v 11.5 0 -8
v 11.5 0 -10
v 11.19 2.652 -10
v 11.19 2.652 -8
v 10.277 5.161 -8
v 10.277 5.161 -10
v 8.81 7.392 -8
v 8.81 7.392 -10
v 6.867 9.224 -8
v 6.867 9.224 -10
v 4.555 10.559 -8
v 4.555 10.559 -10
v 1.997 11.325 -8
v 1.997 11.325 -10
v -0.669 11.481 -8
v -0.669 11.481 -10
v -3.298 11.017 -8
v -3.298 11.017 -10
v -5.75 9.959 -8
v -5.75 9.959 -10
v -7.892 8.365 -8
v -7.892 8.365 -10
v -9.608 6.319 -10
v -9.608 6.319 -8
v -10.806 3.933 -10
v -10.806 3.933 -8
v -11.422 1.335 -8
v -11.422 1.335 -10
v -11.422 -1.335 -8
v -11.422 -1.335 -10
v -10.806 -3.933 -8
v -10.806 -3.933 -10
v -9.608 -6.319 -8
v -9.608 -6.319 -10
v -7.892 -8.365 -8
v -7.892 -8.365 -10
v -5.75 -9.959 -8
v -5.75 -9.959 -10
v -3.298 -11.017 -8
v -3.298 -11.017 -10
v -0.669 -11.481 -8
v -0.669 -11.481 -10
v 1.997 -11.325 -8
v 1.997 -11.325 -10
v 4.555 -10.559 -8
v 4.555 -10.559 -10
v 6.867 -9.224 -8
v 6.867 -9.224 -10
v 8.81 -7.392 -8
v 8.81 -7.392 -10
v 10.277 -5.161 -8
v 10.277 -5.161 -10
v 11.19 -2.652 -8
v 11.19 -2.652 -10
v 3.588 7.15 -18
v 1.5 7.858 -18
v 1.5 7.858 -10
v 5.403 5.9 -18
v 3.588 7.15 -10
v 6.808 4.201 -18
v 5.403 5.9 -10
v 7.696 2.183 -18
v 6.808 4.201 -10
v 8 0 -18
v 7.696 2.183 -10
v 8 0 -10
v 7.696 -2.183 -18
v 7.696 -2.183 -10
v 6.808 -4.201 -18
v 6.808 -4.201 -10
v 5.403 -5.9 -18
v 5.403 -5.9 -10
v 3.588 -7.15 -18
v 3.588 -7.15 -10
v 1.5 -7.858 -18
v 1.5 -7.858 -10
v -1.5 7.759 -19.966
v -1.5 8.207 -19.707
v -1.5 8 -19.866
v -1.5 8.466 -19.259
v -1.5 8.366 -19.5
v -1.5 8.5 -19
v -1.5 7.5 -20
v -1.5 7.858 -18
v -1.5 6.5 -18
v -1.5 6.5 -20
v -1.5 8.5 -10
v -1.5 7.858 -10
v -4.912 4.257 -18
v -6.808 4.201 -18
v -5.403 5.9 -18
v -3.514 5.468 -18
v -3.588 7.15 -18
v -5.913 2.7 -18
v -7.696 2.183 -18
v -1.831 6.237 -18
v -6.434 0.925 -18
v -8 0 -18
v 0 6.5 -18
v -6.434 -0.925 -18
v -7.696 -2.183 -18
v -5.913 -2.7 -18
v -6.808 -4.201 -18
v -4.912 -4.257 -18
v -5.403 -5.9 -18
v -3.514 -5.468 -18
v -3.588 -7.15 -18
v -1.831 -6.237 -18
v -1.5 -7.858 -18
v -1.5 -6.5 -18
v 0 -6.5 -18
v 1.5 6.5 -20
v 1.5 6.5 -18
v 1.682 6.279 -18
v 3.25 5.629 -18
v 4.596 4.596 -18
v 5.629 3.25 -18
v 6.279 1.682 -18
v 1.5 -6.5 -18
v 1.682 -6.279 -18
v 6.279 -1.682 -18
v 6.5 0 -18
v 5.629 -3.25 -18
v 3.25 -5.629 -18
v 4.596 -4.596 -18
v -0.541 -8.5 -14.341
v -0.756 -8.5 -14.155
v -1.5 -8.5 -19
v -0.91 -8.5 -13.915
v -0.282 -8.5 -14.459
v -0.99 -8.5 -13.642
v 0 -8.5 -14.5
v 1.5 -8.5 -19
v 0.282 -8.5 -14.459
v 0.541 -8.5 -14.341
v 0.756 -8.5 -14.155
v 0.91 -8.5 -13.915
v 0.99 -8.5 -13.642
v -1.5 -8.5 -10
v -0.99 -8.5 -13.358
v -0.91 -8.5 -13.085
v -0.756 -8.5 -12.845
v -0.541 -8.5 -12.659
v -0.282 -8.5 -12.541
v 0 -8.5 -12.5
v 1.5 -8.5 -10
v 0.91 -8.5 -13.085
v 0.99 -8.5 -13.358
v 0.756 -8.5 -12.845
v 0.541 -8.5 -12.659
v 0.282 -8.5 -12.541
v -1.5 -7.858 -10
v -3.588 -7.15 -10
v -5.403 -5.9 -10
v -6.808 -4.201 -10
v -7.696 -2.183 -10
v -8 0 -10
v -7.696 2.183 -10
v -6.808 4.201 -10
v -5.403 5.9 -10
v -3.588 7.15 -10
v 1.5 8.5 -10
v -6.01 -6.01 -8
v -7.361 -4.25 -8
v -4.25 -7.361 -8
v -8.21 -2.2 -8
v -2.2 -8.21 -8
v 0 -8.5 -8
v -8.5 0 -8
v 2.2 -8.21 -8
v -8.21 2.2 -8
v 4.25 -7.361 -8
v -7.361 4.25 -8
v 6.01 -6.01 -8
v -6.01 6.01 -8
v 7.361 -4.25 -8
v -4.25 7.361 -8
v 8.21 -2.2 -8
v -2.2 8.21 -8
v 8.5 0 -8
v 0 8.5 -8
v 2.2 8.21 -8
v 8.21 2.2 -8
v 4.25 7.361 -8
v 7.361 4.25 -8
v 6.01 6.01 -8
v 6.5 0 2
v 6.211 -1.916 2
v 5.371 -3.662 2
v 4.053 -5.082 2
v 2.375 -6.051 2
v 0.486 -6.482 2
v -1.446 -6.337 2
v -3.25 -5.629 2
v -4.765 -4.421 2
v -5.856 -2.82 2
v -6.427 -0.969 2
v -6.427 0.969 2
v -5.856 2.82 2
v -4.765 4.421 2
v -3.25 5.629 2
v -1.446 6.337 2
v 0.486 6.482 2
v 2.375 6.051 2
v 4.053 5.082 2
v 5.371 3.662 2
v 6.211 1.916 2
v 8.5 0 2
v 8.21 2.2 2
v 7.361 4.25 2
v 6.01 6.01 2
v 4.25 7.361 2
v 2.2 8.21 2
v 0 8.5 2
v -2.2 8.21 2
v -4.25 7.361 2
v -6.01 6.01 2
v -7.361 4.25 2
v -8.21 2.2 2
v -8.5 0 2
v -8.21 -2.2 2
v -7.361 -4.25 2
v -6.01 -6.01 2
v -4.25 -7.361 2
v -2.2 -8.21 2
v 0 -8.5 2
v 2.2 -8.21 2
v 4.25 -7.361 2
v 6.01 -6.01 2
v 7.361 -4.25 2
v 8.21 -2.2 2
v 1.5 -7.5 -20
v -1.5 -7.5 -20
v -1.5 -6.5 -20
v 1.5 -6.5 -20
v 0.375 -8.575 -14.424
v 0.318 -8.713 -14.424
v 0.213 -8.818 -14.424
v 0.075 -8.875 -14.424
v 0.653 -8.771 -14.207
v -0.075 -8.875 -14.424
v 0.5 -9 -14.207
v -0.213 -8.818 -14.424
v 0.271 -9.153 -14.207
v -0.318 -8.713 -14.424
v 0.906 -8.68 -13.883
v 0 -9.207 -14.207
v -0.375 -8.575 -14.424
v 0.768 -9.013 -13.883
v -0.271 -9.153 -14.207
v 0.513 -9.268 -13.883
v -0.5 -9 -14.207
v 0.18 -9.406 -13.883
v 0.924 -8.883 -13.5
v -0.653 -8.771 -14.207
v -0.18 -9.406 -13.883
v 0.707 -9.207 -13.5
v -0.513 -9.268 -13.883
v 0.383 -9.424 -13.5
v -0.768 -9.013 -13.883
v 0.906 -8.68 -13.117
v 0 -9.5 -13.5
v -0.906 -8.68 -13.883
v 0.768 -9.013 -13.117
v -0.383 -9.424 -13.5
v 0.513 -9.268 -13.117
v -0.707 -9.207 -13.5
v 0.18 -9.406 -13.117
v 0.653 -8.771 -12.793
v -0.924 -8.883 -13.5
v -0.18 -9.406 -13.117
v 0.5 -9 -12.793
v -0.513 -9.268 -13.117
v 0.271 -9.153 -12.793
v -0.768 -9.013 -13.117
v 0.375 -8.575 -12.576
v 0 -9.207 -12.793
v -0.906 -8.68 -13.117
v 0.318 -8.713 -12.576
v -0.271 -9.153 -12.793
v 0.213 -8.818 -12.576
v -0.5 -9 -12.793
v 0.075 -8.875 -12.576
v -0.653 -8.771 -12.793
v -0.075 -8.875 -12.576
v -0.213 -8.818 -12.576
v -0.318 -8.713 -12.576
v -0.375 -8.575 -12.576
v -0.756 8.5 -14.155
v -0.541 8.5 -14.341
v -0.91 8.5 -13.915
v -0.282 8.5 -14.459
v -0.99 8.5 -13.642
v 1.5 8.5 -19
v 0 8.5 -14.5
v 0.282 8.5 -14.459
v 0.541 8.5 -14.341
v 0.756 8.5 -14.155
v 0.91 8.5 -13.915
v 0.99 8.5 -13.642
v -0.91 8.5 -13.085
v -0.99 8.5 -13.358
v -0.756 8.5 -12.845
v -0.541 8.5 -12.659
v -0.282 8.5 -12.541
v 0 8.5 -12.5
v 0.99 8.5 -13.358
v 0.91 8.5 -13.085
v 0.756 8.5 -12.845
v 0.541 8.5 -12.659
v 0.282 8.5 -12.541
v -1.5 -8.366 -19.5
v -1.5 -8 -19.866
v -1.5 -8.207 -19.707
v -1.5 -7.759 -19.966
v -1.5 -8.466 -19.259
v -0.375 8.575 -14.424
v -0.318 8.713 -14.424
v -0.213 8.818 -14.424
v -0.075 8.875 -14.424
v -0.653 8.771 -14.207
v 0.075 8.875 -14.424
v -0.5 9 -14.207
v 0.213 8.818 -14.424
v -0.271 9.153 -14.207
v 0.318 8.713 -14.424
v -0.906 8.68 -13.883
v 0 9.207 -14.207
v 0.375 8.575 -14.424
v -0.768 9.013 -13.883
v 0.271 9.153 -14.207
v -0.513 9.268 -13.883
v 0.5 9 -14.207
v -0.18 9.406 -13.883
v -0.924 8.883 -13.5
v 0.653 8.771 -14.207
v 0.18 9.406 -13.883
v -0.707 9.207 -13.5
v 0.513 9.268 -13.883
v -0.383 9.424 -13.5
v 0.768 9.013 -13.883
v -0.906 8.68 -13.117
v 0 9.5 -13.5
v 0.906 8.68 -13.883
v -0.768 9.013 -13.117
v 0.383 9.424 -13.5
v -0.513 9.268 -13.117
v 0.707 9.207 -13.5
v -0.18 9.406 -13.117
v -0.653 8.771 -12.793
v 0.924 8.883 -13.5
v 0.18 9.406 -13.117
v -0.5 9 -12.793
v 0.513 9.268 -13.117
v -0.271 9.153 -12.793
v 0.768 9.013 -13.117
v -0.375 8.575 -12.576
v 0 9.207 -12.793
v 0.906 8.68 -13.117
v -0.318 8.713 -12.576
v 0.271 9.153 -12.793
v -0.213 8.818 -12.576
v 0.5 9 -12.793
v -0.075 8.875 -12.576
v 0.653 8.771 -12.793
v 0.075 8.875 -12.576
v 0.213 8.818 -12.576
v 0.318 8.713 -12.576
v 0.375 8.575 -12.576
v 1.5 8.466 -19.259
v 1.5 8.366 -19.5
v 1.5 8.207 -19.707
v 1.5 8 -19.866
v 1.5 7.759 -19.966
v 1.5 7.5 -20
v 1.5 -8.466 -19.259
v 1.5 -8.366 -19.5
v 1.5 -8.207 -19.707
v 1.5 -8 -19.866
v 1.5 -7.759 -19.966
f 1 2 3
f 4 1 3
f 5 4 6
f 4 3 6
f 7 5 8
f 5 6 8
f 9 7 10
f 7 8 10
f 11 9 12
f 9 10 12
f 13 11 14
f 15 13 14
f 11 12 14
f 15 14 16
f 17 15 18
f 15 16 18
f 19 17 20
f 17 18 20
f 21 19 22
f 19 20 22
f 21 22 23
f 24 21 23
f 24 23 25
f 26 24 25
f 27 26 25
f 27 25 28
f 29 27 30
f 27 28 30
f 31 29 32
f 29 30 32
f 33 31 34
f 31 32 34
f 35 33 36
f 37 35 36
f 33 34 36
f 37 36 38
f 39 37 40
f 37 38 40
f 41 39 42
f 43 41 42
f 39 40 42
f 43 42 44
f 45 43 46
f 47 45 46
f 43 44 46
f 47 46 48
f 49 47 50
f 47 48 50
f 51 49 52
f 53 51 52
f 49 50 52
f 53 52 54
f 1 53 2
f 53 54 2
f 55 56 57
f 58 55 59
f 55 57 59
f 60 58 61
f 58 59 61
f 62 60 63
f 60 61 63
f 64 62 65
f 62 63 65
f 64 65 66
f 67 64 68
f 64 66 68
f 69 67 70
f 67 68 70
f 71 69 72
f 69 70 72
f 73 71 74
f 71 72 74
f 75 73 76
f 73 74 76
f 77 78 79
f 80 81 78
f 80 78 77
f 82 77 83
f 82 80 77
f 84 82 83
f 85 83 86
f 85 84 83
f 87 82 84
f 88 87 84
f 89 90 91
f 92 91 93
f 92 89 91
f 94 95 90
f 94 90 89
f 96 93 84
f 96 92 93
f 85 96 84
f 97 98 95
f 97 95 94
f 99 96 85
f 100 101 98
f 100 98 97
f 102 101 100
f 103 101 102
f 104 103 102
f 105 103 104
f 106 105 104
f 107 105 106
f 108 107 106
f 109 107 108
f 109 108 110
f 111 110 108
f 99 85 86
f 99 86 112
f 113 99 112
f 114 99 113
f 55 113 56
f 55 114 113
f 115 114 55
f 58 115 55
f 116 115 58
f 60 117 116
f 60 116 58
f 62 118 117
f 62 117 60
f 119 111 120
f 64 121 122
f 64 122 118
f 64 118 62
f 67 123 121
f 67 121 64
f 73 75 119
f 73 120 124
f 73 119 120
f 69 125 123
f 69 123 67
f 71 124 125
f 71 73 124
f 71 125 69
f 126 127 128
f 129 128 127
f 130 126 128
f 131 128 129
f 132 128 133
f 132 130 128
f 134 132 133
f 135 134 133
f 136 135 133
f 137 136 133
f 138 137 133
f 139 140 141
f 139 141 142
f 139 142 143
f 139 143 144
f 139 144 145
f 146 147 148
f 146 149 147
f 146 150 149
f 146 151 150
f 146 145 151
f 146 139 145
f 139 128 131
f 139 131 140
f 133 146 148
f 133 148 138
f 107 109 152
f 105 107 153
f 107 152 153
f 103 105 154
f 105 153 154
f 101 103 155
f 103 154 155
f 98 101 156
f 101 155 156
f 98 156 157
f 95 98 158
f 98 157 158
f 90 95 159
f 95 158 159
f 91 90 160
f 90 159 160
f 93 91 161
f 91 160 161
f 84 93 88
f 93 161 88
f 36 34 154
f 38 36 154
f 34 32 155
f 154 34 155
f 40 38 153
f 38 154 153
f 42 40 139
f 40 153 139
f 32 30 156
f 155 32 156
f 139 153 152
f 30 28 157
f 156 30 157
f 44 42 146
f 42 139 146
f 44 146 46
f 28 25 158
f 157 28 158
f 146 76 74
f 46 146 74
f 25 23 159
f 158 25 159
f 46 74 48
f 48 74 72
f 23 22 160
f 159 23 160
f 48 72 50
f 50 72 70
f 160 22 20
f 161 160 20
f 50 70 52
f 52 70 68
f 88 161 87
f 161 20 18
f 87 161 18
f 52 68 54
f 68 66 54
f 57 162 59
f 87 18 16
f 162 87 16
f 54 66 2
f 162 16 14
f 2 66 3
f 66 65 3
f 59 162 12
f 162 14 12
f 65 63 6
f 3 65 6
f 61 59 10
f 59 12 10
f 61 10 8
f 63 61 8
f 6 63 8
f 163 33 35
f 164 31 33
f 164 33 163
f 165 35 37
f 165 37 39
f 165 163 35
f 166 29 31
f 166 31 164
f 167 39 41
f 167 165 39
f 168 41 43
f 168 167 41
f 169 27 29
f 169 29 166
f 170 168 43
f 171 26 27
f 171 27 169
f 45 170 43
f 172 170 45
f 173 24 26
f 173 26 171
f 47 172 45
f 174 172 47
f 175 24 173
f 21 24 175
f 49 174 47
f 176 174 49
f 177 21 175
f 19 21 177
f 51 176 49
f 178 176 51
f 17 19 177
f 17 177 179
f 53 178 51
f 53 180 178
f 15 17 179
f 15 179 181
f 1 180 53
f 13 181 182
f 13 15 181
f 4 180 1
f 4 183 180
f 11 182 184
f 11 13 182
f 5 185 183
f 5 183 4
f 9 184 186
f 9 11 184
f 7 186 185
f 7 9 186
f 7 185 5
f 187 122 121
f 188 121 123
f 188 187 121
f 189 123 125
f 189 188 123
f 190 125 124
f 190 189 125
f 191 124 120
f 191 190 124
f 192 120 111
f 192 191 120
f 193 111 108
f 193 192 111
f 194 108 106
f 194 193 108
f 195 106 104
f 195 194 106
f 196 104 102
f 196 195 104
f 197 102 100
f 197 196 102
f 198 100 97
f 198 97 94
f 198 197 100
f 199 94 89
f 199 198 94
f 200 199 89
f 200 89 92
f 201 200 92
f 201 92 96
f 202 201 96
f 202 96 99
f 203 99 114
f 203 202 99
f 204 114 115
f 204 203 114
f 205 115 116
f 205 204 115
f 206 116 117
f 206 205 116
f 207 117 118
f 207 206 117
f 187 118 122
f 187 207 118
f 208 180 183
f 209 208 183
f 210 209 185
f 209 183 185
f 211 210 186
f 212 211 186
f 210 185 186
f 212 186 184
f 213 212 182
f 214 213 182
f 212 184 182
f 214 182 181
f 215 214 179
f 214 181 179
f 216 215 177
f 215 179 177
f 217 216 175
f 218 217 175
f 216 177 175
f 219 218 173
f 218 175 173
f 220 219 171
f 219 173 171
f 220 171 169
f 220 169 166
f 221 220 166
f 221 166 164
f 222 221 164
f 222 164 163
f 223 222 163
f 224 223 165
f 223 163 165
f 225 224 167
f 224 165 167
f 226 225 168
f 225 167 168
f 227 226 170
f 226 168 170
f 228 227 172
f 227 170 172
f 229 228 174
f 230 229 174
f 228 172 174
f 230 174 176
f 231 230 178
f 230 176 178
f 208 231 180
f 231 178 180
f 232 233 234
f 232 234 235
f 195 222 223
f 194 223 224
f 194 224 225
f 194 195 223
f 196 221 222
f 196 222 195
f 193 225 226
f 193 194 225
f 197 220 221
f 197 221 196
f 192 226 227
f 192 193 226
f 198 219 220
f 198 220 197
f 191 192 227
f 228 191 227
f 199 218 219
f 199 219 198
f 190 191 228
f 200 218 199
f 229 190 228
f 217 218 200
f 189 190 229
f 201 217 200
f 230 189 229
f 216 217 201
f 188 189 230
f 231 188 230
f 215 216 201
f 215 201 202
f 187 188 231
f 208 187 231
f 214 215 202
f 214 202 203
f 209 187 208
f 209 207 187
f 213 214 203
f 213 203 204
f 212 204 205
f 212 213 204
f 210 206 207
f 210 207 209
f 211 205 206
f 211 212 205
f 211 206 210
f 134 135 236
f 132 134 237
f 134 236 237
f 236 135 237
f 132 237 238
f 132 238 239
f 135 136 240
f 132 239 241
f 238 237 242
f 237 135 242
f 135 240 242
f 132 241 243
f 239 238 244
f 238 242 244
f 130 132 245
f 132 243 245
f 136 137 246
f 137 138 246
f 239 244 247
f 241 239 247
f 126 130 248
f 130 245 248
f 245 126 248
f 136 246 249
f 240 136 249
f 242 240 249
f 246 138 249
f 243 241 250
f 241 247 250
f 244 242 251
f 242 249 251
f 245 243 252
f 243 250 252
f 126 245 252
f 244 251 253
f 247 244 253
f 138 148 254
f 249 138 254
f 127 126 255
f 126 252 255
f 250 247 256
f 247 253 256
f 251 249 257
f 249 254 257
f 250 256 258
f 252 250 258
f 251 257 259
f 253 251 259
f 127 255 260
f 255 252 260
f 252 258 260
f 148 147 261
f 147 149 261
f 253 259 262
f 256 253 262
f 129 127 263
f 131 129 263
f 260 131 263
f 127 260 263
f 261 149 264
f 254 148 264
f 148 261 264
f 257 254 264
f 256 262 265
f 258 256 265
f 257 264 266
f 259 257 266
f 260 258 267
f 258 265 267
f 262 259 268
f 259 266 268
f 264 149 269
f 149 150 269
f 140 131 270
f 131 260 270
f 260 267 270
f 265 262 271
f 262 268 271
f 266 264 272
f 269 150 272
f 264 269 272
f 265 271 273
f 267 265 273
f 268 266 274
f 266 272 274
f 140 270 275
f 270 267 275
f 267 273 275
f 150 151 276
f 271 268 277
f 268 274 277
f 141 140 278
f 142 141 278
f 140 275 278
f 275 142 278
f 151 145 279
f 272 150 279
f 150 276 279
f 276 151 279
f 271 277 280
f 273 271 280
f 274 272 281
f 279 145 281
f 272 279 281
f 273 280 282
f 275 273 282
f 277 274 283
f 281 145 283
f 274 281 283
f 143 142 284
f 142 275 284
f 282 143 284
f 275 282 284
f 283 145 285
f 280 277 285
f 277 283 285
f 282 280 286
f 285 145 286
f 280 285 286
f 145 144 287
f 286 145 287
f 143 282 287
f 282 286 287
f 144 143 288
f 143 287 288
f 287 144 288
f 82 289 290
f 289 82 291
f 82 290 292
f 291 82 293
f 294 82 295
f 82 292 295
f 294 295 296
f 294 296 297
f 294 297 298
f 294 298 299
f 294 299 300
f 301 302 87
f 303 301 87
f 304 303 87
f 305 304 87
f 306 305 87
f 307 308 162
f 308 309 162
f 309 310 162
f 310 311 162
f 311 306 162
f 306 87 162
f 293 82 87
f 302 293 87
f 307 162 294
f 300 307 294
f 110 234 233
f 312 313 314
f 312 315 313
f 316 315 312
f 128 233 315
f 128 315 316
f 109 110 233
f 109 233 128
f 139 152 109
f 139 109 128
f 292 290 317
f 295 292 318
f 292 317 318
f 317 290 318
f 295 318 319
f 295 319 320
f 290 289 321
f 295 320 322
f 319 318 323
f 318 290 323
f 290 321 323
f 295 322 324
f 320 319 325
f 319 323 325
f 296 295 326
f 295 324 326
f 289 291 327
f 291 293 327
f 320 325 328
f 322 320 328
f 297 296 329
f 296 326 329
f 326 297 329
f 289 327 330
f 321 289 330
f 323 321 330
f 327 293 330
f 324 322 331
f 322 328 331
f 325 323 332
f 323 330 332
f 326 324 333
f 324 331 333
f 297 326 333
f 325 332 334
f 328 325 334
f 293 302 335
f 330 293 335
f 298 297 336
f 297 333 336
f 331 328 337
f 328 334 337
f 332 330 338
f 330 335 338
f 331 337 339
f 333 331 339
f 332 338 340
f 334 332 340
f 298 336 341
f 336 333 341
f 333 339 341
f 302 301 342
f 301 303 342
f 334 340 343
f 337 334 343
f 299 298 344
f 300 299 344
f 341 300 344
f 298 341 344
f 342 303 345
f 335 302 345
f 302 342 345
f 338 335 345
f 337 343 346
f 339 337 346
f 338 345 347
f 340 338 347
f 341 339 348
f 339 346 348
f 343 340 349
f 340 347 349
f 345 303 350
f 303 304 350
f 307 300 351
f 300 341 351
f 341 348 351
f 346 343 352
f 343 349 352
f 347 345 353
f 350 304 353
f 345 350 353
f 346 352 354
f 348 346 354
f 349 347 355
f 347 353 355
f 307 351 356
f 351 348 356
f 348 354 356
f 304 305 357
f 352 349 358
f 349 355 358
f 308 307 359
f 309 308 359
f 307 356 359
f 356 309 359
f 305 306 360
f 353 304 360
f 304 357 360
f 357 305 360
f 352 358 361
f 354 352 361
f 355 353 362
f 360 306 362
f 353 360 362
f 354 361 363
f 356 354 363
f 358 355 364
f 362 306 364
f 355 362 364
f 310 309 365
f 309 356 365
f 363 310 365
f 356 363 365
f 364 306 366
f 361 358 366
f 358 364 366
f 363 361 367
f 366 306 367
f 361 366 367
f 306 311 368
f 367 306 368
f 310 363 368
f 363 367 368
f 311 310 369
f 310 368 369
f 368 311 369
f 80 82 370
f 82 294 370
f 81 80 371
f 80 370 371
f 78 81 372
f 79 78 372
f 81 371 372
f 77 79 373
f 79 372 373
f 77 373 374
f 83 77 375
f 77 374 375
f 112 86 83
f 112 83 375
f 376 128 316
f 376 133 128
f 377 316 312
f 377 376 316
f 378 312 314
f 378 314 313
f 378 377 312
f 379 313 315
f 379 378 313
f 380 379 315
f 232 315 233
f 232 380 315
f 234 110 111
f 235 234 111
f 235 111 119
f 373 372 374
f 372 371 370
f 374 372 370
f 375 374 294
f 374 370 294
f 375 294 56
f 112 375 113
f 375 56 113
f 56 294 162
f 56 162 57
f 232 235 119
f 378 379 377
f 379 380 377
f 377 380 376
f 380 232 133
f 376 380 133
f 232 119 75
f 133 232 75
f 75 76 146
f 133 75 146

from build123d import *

# Parameters (mm, degrees)
SKETCH140_R         = 11.5
SKETCH140_R_2       = 6.5
PAD054_DEPTH        = 2
SKETCH141_R         = 8.5
SKETCH141_R_2       = 6.5
PAD055_DEPTH        = 10
SKETCH142_W         = 3
SKETCH142_H         = 2
PAD056_DEPTH        = 10
REVOLUTION015_ANGLE = -180
REVOLUTION016_ANGLE = -180
FILLET_R            = 1
SKETCH171_R         = 8
SKETCH171_R_2       = 6.5
PAD068_DEPTH        = 8


with BuildPart() as part:
    # Sketch140 → Pad054 (new body)
    with BuildSketch(Plane.XY):
        Circle(SKETCH140_R)
        Circle(SKETCH140_R_2, mode=Mode.SUBTRACT)
    extrude(amount=PAD054_DEPTH)

    # Sketch141 (on Face4 of Pad054) → Pad055 (join)
    with BuildSketch(Plane.XY.offset(2)):
        Circle(SKETCH141_R)
        Circle(SKETCH141_R_2, mode=Mode.SUBTRACT)
    extrude(amount=PAD055_DEPTH)

    # Sketch142 (on Face2 of Pad055) → Pad056 (join)
    with BuildSketch(Plane(origin=(0, 0, 0), x_dir=(1, 0, 0), z_dir=(0, 0, -1))):
        with Locations((0, 7.5)):
            Rectangle(SKETCH142_W, SKETCH142_H)
        with Locations((0, -7.5)):
            Rectangle(SKETCH142_W, SKETCH142_H)
    extrude(amount=PAD056_DEPTH)

    # Sketch154 (on Face11 of Pad056) → Revolution015 (revolve)
    with BuildSketch(Plane.XZ.offset(8.5)):
        with BuildLine():
            ThreePointArc((0, -4.5), (1, -3.5), (0, -2.5))
            Line((0, -2.5), (0, -4.5))
        make_face()
    revolve(axis=Axis((0, -8.5, 0), (0, 0, 1)), revolution_arc=REVOLUTION015_ANGLE)

    # Sketch155 (on Face7 of Revolution015) → Revolution016 (revolve)
    with BuildSketch(Plane(origin=(0, 8.5, 0), x_dir=(-1, 0, 0), z_dir=(0, 1, 0))):
        with BuildLine():
            ThreePointArc((0, -4.5), (1, -3.5), (0, -2.5))
            Line((0, -2.5), (0, -4.5))
        make_face()
    revolve(axis=Axis((0, 8.5, 0), (0, 0, 1)), revolution_arc=REVOLUTION016_ANGLE)

    # Fillet
    fillet_edges = [part.edges().sort_by_distance(p)[0] for p in [
        (0, 8.5, -10),
        (0, -8.5, -10),
    ]]
    fillet(fillet_edges, radius=FILLET_R)

    # Sketch171 (on Face6 of Fillet) → Pad068 (join)
    with BuildSketch(Plane(origin=(0, 0, 0), x_dir=(1, 0, 0), z_dir=(0, 0, -1))):
        Circle(SKETCH171_R)
        Circle(SKETCH171_R_2, mode=Mode.SUBTRACT)
    extrude(amount=PAD068_DEPTH)


with BuildPart() as part_1:
    # Body placement: moved
    add(part.part.moved(Location((0, 0, -10))))


solid = part_1.part
